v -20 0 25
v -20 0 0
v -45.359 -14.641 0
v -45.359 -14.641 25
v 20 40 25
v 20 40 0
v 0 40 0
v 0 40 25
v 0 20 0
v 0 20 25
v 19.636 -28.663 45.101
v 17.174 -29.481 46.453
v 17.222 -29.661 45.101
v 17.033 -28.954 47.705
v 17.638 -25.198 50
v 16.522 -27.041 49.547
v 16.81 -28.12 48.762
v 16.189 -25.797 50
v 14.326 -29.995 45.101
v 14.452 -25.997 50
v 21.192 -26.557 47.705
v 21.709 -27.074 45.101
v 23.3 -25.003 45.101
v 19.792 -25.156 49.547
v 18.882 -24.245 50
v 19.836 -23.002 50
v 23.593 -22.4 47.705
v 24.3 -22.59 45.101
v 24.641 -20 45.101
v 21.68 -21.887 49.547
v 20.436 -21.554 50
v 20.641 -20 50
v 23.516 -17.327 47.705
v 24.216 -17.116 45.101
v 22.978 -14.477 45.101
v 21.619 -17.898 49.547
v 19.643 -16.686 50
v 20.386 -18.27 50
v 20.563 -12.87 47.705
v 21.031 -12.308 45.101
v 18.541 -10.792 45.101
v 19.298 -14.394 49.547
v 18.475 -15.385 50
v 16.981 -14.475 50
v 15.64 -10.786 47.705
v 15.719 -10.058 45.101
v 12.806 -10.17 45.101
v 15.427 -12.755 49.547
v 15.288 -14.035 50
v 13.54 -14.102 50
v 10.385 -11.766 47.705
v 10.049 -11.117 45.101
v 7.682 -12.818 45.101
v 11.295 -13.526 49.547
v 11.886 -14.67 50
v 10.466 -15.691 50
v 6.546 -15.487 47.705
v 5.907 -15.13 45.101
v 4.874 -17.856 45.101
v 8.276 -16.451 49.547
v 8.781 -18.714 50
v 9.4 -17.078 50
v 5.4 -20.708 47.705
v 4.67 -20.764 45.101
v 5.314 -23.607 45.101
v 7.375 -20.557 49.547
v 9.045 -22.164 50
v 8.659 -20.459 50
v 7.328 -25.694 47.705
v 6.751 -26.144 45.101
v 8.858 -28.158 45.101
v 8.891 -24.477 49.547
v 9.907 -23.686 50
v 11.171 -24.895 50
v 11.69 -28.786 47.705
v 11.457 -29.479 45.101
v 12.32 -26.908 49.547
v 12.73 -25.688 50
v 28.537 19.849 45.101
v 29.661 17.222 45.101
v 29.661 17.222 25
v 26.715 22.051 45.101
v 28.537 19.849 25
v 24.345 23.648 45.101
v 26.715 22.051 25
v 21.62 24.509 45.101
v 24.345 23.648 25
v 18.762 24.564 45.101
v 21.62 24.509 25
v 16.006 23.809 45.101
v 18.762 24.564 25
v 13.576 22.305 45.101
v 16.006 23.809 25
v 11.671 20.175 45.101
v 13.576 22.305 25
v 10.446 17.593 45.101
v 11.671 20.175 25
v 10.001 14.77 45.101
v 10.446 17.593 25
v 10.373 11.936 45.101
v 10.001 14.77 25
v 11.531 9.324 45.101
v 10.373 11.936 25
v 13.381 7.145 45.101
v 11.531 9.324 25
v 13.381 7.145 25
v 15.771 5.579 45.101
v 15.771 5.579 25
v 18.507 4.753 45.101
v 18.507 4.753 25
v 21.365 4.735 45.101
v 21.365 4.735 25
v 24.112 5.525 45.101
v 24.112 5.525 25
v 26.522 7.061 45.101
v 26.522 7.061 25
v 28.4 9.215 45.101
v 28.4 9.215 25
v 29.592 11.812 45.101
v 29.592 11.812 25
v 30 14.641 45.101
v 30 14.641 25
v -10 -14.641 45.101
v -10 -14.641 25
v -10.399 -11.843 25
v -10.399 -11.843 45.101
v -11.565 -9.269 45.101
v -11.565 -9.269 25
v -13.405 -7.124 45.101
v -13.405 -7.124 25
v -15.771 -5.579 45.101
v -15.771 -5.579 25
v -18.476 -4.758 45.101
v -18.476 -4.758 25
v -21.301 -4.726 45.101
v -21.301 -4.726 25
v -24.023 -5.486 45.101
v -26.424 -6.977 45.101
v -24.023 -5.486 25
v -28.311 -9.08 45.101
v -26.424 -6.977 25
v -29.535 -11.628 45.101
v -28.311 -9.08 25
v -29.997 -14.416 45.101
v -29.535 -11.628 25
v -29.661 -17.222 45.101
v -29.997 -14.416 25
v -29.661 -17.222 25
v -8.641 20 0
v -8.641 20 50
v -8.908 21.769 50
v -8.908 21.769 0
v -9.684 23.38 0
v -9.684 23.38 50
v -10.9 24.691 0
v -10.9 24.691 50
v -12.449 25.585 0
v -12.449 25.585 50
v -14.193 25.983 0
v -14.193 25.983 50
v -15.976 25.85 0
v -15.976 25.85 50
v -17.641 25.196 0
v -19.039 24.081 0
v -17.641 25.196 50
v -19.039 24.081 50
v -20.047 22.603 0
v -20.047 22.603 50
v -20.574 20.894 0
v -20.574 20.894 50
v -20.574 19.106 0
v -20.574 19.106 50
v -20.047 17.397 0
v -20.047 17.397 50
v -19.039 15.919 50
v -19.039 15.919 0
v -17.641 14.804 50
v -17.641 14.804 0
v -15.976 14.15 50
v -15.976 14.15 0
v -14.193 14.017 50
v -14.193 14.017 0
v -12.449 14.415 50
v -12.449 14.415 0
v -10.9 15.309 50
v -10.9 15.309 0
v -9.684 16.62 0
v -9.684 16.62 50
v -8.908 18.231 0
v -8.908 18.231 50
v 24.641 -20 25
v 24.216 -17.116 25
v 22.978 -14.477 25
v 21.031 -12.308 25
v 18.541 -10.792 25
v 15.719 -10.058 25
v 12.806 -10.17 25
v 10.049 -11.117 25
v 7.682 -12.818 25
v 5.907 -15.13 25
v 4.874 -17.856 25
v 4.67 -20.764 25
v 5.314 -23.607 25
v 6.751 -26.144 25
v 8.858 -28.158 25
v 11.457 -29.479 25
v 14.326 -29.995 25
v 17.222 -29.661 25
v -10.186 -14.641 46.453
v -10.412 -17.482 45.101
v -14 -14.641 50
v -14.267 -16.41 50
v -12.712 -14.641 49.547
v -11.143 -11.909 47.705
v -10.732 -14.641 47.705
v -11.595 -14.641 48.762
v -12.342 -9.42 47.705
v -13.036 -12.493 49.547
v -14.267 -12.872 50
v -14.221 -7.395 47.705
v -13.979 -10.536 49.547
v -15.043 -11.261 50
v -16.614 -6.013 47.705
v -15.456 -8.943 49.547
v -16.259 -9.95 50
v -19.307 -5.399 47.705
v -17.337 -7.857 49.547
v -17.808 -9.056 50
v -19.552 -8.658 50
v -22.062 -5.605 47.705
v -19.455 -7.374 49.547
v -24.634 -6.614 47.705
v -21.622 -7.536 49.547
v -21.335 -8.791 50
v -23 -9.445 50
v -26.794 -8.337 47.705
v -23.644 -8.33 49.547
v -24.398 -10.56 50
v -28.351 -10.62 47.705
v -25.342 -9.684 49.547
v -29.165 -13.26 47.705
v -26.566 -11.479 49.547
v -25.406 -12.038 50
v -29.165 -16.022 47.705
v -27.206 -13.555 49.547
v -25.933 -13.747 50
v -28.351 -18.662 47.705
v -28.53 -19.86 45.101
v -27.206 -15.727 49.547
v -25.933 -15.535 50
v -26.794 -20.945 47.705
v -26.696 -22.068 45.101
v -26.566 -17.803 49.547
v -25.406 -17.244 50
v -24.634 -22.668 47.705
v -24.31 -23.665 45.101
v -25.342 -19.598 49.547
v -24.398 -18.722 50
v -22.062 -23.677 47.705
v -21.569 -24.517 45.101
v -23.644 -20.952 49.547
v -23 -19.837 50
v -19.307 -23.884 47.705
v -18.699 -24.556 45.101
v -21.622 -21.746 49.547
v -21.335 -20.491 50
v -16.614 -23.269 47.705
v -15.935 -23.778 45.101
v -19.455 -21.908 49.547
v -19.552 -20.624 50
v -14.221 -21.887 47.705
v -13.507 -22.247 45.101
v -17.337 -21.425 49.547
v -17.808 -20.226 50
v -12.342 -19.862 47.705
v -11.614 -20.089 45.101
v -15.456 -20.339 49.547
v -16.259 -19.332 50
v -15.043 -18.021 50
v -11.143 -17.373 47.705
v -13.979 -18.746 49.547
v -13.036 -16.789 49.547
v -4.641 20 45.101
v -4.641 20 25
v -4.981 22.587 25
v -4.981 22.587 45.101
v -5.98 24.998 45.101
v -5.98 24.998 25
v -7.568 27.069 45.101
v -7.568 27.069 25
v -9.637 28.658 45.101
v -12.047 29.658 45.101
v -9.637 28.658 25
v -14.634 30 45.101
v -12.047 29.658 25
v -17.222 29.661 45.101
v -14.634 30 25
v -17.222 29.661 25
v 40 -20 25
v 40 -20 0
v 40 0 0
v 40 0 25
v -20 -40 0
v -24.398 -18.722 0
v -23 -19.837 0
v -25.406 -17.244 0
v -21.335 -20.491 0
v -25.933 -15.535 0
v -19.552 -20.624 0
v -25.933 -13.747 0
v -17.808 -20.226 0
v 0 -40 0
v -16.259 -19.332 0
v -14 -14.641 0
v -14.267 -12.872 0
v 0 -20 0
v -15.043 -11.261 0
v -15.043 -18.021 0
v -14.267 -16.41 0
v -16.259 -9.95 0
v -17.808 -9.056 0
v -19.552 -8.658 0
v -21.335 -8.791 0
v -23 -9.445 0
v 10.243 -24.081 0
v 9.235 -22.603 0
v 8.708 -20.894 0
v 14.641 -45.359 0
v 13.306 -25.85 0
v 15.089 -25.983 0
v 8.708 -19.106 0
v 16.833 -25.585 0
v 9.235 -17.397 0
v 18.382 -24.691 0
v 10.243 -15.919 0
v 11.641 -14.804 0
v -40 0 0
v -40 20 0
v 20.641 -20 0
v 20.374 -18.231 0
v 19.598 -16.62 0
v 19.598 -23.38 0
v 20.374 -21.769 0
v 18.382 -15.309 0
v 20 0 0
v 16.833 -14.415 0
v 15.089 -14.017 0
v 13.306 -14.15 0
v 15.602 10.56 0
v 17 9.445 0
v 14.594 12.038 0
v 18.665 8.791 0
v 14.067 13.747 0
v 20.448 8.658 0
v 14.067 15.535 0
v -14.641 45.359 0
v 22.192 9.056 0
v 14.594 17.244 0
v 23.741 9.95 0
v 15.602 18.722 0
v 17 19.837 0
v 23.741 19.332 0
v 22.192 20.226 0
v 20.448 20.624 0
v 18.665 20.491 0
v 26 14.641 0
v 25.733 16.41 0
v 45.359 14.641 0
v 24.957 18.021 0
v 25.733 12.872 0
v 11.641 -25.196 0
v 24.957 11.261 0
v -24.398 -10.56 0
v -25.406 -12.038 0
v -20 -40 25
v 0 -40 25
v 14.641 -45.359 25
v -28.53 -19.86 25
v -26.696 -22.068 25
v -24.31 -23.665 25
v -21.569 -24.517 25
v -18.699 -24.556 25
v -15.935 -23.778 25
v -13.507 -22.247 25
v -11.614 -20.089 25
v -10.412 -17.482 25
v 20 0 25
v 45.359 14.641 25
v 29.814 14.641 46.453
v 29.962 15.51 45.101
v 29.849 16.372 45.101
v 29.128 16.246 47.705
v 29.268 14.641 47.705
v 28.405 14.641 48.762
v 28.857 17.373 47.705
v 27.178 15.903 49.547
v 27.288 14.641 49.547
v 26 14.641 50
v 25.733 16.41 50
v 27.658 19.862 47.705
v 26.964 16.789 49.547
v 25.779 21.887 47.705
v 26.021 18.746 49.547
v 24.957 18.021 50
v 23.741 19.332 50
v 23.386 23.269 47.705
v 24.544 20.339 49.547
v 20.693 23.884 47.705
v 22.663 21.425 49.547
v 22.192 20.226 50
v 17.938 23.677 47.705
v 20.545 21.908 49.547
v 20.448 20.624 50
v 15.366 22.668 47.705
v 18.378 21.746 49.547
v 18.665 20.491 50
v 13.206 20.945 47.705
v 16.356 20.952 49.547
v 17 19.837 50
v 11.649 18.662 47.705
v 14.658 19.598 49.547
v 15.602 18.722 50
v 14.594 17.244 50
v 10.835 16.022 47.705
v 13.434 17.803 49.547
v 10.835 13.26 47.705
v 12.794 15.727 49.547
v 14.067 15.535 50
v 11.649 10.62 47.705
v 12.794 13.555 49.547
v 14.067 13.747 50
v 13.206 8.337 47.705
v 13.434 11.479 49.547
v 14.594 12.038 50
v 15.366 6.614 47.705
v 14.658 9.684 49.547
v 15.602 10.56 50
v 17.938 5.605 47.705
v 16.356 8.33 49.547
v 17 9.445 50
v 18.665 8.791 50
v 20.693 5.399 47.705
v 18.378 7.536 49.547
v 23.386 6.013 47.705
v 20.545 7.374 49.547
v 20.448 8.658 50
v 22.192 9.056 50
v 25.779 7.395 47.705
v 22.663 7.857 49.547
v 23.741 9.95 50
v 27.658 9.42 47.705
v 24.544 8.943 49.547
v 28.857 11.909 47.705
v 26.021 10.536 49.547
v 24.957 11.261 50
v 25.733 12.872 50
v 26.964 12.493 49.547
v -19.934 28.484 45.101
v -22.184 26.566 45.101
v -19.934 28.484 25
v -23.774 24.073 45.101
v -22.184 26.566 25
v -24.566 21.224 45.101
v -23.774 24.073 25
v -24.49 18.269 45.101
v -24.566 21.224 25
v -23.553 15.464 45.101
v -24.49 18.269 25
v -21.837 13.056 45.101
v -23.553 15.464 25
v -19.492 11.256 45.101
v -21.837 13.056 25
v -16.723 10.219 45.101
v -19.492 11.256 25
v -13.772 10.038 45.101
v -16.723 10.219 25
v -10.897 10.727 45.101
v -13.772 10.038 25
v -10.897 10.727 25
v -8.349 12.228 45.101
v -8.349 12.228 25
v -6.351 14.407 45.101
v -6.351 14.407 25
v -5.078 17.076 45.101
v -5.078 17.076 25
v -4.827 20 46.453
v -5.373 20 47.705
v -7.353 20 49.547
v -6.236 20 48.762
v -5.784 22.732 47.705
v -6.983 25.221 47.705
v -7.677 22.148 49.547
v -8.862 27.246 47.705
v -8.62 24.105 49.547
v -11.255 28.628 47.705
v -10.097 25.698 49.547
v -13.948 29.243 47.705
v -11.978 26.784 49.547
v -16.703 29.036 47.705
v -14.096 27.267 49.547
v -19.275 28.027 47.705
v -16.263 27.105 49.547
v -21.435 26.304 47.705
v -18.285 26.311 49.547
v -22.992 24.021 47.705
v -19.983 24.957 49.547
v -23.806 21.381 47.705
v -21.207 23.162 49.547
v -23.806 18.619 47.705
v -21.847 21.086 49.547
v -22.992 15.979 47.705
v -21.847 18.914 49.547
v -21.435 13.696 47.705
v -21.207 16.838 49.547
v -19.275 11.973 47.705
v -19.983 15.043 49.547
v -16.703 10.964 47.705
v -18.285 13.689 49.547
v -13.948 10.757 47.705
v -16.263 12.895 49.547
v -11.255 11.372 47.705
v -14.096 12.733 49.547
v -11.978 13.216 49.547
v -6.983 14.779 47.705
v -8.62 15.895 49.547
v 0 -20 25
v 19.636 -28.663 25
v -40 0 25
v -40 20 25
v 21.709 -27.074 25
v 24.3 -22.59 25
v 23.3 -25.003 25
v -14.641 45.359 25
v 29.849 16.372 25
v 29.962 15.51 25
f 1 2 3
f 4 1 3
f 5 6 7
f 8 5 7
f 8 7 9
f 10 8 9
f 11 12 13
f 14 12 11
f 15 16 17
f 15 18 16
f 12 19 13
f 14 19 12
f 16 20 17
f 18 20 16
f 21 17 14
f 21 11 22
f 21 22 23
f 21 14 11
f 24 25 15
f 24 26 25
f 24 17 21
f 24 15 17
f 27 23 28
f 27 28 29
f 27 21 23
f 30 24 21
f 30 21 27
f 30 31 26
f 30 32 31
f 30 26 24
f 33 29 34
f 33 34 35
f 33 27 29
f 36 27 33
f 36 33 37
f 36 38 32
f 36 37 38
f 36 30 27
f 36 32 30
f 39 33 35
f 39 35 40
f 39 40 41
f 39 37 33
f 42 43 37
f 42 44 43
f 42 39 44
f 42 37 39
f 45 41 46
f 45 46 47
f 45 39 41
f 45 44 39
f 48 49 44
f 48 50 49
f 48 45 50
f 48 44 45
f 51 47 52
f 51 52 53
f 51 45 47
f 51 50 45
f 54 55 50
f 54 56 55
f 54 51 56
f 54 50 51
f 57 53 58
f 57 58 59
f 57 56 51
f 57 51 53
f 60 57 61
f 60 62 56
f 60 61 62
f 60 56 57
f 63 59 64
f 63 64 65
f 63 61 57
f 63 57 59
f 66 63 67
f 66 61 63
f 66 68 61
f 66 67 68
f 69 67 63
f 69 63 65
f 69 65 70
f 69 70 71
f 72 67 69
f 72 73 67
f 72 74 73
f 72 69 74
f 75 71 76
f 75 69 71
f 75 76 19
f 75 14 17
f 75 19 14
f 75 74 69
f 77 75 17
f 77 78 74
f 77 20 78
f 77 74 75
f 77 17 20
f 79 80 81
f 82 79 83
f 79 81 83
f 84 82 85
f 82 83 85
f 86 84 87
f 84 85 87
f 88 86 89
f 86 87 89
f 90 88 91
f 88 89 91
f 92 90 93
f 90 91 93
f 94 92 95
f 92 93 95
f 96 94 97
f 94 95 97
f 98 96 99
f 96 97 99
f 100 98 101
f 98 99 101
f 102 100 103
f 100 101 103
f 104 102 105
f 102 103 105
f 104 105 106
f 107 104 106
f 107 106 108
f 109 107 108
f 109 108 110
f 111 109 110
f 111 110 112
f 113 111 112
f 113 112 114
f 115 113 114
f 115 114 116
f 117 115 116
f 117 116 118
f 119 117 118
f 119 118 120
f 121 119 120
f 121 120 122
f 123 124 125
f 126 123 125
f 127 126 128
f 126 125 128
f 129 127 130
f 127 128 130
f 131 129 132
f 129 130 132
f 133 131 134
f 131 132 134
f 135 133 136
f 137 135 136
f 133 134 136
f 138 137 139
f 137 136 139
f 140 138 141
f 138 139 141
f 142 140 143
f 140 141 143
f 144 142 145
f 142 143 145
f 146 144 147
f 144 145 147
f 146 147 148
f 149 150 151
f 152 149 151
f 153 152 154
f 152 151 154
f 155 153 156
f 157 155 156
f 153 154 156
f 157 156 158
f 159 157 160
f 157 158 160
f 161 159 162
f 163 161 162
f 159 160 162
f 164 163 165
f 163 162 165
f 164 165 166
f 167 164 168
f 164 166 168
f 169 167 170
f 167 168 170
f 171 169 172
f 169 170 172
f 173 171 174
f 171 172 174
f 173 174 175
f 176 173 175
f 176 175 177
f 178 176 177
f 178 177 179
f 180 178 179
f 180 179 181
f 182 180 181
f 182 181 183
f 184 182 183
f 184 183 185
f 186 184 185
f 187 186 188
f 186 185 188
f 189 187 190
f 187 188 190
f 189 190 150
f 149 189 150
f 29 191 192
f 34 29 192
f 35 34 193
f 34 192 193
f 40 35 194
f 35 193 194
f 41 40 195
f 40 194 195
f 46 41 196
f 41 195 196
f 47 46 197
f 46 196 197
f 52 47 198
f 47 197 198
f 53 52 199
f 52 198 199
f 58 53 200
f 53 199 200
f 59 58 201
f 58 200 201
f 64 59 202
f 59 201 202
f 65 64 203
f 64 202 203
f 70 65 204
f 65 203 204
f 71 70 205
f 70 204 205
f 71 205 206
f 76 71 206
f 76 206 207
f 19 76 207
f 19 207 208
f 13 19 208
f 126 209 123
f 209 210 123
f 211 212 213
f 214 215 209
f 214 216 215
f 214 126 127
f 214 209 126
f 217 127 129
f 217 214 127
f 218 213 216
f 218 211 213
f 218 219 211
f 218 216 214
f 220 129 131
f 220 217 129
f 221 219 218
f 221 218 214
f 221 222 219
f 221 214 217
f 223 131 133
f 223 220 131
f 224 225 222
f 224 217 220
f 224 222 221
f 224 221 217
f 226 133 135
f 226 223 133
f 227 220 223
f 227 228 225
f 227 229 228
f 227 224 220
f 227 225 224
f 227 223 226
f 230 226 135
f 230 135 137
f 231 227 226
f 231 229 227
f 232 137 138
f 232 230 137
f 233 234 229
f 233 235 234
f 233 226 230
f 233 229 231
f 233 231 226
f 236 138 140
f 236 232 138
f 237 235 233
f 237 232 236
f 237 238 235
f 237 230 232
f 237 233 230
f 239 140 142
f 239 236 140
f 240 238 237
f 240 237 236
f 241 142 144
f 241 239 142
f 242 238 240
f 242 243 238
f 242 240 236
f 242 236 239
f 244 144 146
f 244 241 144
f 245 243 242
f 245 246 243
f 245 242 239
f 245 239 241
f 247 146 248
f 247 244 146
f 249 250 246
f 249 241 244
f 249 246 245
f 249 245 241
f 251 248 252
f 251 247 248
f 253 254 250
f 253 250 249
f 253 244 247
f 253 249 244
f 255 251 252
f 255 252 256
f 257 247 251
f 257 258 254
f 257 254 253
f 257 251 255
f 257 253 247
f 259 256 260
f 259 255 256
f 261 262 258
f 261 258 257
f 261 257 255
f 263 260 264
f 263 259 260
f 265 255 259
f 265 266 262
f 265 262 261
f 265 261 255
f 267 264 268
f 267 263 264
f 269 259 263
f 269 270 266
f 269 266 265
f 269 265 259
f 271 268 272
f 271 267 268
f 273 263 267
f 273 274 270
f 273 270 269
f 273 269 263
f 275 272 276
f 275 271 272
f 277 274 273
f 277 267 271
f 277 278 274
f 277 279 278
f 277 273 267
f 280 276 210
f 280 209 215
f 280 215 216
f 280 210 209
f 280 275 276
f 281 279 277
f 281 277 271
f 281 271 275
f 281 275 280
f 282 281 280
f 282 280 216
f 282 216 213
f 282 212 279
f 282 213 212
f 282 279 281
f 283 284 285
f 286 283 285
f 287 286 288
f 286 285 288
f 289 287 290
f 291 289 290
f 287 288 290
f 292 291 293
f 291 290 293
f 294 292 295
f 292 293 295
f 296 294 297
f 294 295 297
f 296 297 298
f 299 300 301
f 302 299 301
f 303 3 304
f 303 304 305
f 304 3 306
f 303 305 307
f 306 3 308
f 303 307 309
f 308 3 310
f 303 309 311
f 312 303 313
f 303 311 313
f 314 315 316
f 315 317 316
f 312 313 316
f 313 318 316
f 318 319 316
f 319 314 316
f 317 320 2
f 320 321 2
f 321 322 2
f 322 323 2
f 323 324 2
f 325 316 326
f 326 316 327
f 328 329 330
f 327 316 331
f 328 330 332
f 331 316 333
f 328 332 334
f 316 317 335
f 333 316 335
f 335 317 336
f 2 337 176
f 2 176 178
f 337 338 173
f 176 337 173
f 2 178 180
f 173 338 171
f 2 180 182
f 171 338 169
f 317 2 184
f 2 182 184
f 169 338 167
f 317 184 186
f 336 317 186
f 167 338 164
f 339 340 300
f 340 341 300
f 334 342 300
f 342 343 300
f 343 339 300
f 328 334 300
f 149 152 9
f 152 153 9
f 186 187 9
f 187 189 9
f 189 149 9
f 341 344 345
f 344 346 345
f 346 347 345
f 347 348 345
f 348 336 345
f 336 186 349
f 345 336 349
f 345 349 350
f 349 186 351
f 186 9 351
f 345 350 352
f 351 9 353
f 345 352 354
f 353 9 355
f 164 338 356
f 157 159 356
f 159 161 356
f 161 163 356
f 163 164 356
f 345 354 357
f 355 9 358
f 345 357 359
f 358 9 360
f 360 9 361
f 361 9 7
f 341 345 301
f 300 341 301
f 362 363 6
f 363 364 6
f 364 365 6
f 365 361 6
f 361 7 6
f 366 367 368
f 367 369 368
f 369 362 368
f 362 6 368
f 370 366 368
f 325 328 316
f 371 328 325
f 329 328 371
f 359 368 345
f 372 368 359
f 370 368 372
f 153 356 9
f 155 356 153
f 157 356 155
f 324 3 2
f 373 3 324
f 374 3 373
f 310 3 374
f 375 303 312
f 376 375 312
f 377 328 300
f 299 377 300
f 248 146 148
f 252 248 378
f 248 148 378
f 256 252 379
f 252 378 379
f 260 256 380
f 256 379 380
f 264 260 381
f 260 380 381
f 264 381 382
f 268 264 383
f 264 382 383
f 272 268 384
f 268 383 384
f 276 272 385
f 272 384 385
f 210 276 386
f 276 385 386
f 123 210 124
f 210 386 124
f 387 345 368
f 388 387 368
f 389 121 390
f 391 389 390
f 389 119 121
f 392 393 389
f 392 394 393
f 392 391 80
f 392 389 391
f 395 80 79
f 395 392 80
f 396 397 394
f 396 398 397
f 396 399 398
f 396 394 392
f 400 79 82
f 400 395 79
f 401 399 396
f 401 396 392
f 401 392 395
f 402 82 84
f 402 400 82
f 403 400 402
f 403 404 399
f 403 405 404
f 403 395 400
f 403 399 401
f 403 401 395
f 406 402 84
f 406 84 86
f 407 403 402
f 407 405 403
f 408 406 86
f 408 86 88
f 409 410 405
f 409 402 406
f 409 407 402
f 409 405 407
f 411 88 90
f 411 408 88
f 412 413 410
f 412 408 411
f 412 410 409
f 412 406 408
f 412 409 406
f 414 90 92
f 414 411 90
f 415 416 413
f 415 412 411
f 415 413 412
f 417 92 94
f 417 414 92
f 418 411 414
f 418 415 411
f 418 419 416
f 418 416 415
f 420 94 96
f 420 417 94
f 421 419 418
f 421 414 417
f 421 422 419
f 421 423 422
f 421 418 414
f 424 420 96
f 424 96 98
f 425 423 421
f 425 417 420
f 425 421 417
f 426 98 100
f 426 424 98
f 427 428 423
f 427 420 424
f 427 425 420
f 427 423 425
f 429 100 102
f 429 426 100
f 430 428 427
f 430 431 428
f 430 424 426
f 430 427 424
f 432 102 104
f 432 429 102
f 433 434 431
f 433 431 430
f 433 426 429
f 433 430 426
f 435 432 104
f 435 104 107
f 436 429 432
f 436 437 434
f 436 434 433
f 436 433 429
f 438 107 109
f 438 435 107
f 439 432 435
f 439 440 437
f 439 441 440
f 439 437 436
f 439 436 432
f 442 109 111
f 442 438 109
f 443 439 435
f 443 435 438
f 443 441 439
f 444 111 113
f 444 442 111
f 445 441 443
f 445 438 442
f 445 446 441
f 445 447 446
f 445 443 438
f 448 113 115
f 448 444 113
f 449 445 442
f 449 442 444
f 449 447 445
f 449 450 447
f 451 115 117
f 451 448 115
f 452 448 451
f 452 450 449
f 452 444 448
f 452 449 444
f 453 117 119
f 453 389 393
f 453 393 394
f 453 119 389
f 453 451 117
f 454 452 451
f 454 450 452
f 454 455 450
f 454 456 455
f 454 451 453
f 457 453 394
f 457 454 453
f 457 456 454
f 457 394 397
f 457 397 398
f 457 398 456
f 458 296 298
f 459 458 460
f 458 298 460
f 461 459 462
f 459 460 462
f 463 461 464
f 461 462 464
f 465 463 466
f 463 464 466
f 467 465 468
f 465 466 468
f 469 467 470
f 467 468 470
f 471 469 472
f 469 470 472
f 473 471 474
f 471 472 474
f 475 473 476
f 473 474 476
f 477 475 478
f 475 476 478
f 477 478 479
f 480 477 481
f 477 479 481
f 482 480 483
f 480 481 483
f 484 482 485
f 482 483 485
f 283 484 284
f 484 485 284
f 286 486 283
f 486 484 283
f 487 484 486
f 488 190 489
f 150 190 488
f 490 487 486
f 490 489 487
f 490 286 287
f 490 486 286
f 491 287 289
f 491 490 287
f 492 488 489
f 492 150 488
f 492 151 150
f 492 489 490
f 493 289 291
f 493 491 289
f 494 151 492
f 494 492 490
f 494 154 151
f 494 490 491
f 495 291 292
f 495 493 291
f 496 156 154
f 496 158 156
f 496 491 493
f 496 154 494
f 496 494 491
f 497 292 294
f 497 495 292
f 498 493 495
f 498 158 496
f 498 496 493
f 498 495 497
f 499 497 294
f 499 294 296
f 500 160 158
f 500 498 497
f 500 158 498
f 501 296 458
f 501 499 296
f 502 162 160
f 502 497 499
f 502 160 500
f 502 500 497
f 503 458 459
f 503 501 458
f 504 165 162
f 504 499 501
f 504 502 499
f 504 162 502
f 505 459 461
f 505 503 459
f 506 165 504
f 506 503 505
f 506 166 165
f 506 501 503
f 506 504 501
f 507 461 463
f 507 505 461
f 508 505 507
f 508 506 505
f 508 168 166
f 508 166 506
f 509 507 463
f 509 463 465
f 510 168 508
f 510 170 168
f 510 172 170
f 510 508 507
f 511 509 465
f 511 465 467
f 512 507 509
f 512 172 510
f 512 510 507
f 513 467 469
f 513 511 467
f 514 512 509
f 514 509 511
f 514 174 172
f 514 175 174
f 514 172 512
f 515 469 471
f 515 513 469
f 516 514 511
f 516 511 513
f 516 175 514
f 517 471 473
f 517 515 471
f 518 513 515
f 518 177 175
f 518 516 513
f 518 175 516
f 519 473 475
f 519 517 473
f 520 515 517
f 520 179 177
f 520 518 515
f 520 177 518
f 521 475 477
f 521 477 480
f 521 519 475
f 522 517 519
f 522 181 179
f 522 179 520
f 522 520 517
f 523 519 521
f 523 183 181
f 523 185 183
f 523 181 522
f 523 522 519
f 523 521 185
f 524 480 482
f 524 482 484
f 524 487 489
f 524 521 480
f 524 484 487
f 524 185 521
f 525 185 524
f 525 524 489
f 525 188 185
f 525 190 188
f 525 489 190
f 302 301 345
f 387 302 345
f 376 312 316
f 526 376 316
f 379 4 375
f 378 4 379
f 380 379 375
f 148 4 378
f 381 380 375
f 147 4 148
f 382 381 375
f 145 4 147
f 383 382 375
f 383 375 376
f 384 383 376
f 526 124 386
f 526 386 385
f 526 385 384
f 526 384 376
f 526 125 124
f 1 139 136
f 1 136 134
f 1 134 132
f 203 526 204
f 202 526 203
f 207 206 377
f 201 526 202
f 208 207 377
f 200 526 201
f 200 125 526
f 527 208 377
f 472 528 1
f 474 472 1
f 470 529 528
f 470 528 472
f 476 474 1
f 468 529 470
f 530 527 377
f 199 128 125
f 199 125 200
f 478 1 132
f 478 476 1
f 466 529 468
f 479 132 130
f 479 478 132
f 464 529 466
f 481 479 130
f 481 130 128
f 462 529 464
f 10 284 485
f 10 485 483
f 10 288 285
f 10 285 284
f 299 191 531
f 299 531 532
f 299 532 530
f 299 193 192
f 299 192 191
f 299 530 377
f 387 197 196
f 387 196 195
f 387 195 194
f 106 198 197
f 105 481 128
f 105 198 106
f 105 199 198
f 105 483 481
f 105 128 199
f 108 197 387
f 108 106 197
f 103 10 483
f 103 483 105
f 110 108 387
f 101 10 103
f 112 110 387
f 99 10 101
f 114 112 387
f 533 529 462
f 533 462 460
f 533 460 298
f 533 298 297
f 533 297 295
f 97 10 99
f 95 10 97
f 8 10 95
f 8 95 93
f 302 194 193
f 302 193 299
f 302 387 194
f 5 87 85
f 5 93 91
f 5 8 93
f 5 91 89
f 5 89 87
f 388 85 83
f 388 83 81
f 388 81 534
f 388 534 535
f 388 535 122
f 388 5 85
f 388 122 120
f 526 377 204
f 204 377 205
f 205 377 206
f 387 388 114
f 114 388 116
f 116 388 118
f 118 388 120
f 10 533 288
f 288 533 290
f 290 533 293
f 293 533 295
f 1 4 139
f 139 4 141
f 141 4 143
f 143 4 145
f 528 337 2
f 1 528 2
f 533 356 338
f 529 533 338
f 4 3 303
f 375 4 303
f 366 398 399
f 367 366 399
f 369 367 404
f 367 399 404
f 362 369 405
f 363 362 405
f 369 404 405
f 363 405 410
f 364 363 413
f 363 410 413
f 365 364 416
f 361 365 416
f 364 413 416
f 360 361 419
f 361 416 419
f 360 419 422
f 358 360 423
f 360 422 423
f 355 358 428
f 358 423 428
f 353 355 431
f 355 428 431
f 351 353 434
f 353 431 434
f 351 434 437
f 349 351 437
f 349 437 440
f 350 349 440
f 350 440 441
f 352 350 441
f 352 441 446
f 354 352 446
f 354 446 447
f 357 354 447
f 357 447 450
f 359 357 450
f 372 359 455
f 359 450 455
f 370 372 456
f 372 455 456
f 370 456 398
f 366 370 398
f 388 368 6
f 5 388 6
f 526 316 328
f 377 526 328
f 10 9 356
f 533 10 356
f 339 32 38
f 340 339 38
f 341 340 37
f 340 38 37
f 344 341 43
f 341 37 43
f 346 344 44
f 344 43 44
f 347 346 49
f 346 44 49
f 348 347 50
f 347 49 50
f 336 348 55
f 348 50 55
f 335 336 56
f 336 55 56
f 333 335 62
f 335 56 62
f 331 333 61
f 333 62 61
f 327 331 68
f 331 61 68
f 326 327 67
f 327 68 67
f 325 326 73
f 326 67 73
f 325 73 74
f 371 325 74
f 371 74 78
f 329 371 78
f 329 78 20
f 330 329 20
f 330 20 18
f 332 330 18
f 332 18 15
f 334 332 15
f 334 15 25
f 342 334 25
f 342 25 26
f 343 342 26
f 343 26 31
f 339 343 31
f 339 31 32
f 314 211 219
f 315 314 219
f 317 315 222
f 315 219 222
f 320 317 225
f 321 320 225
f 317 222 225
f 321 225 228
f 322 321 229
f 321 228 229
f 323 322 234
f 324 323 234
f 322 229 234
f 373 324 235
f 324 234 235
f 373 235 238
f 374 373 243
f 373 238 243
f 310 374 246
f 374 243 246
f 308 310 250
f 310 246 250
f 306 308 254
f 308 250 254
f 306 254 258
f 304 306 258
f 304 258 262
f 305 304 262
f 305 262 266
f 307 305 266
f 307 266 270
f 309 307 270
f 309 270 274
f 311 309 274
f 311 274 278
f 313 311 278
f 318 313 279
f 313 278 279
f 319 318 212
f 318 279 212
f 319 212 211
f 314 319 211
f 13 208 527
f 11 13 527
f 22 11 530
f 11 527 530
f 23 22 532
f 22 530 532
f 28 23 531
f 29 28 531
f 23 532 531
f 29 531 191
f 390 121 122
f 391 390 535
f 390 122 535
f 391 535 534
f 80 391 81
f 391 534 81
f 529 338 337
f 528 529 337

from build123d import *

# Parameters (mm, degrees)
F1_DEPTH = 25
F2_DEPTH = 50
F3_R     = 6
F4_DEPTH = 50
F5_DEPTH = 50


# Not quite as in the source:
# - a fillet or chamfer that OpenCascade refuses, or shapes differently, is made with other operations: its cross-section is extruded or revolved along the edge and cut away or added


with BuildPart() as f1:
    # F0 (on Top) → F1 (new body)
    with BuildSketch(Plane.XY):
        Polygon((0, -20), (0, 0), (-20, 0), (-45.3589838486, -14.6410161514), (-20, -40), (0, -40), align=None)
        with BuildLine():
            ThreePointArc((-10, -14.6410161514), (-18.6986197214, -24.5559750202), (-29.6612818741, -17.2216425383))
            ThreePointArc((-29.6612818741, -17.2216425383), (-21.3013802786, -4.7260572825), (-10, -14.6410161514))
        make_face(mode=Mode.SUBTRACT)
        Polygon((-20, 0), (0, 0), (0, 20), (-14.6410161514, 45.3589838486), (-40, 20), (-40, 0), align=None)
        with BuildLine():
            ThreePointArc((-4.6410161514, 20), (-20.7317359828, 12.0688505288), (-17.2216425383, 29.6612818741))
            ThreePointArc((-17.2216425383, 29.6612818741), (-8.5502963199, 27.9311494712), (-4.6410161514, 20))
        make_face(mode=Mode.SUBTRACT)
        Polygon((0, 20), (0, 0), (20, 0), (45.3589838486, 14.6410161514), (20, 40), (0, 40), align=None)
        with BuildLine():
            ThreePointArc((30, 14.6410161514), (10.0850411312, 13.3396358728), (29.6612818741, 17.2216425383))
            ThreePointArc((29.6612818741, 17.2216425383), (29.9149588688, 15.9423964299), (30, 14.6410161514))
        make_face(mode=Mode.SUBTRACT)
        Polygon((20, 0), (0, 0), (0, -20), (14.6410161514, -45.3589838486), (40, -20), (40, 0), align=None)
        with BuildLine():
            ThreePointArc((24.6410161514, -20), (22.5721656226, -26.0907198315), (17.2216425383, -29.6612818741))
            ThreePointArc((17.2216425383, -29.6612818741), (6.7098666802, -13.9092801685), (24.6410161514, -20))
        make_face(mode=Mode.SUBTRACT)
        with BuildLine():
            ThreePointArc((-10, -14.6410161514), (-21.3013802786, -4.7260572825), (-29.6612818741, -17.2216425383))
            ThreePointArc((-29.6612818741, -17.2216425383), (-18.6986197214, -24.5559750202), (-10, -14.6410161514))
        make_face()
        with BuildLine():
            ThreePointArc((-4.6410161514, 20), (-8.5502963199, 27.9311494712), (-17.2216425383, 29.6612818741))
            ThreePointArc((-17.2216425383, 29.6612818741), (-20.7317359828, 12.0688505288), (-4.6410161514, 20))
        make_face()
        with BuildLine():
            ThreePointArc((30, 14.6410161514), (29.9149588688, 15.9423964299), (29.6612818741, 17.2216425383))
            ThreePointArc((29.6612818741, 17.2216425383), (10.0850411312, 13.3396358728), (30, 14.6410161514))
        make_face()
        with BuildLine():
            ThreePointArc((24.6410161514, -20), (6.7098666802, -13.9092801685), (17.2216425383, -29.6612818741))
            ThreePointArc((17.2216425383, -29.6612818741), (22.5721656226, -26.0907198315), (24.6410161514, -20))
        make_face()
    extrude(amount=F1_DEPTH)

    # F0 (on Top) → F2 (join)
    with BuildSketch(Plane.XY):
        with BuildLine():
            ThreePointArc((24.6410161514, -20), (6.7098666802, -13.9092801685), (17.2216425383, -29.6612818741))
            ThreePointArc((17.2216425383, -29.6612818741), (22.5721656226, -26.0907198315), (24.6410161514, -20))
        make_face()
        with BuildLine():
            ThreePointArc((-10, -14.6410161514), (-21.3013802786, -4.7260572825), (-29.6612818741, -17.2216425383))
            ThreePointArc((-29.6612818741, -17.2216425383), (-18.6986197214, -24.5559750202), (-10, -14.6410161514))
        make_face()
        with BuildLine():
            ThreePointArc((-4.6410161514, 20), (-8.5502963199, 27.9311494712), (-17.2216425383, 29.6612818741))
            ThreePointArc((-17.2216425383, 29.6612818741), (-20.7317359828, 12.0688505288), (-4.6410161514, 20))
        make_face()
        with BuildLine():
            ThreePointArc((30, 14.6410161514), (29.9149588688, 15.9423964299), (29.6612818741, 17.2216425383))
            ThreePointArc((29.6612818741, 17.2216425383), (10.0850411312, 13.3396358728), (30, 14.6410161514))
        make_face()
    extrude(amount=F2_DEPTH)

    # F3 (on face) → F4 (cut)
    with BuildSketch(Plane.XY.offset(50)):
        with Locations((-14.6410161514, 20)):
            Circle(F3_R)
    extrude(amount=-F4_DEPTH, mode=Mode.SUBTRACT)

    # F3 (on face) → F5 (cut)
    with BuildSketch(Plane.XY.offset(50)):
        with Locations((20, 14.6410161514)):
            Circle(F3_R)
        with Locations((14.6410161514, -20)):
            Circle(F3_R)
        with Locations((-20, -14.6410161514)):
            Circle(F3_R)
        with Locations((-14.6410161514, 20)):
            Circle(F3_R)
    extrude(amount=-F5_DEPTH, mode=Mode.SUBTRACT)

    # F6: fillet of radius 5 on 4 edges, made by hand

    # F6_s1 → F6_t2 (revolve, cut)
    with BuildSketch(Plane.XZ.offset(14.6410161514)):
        with BuildLine():
            ThreePointArc((-10, 45.1010205144), (-11.1270166538, 48.2632981746), (-14, 50))
            Line((-14, 50), (-10, 50))
            Line((-10, 50), (-10, 45.1010205144))
        make_face()
    revolve(axis=Axis((-20, -14.6410161514, 50), (0, 0, 1)), mode=Mode.SUBTRACT)

    # F6_s3 → F6_t4 (revolve, cut)
    with BuildSketch(Plane.XZ.offset(-20)):
        with BuildLine():
            ThreePointArc((-4.6410161514, 45.1010205144), (-5.7680328052, 48.2632981746), (-8.6410161514, 50))
            Line((-8.6410161514, 50), (-4.6410161514, 50))
            Line((-4.6410161514, 50), (-4.6410161514, 45.1010205144))
        make_face()
    revolve(axis=Axis((-14.6410161514, 20, 50), (0, 0, 1)), mode=Mode.SUBTRACT)

    # F6_s5 → F6_t6 (revolve, cut)
    with BuildSketch(Plane(origin=(8.6795464871, 2.3183949069, 0), x_dir=(0, 0, 1), z_dir=(-0.9661281874, -0.2580626387, 0))):
        with BuildLine():
            ThreePointArc((45.1010205144, -33.1008630094), (48.2632981746, -31.9738463556), (50, -29.1008630094))
            Line((50, -29.1008630094), (50, -33.1008630094))
            Line((50, -33.1008630094), (45.1010205144, -33.1008630094))
        make_face()
    revolve(axis=Axis((14.6410161514, -20, 50), (0, 0, 1)), mode=Mode.SUBTRACT)

    # F6_s7 → F6_t8 (revolve, cut)
    with BuildSketch(Plane.XZ.offset(-14.6410161514)):
        with BuildLine():
            ThreePointArc((30, 45.1010205144), (28.8729833462, 48.2632981746), (26, 50))
            Line((26, 50), (30, 50))
            Line((30, 50), (30, 45.1010205144))
        make_face()
    revolve(axis=Axis((20, 14.6410161514, 50), (0, 0, 1)), mode=Mode.SUBTRACT)


solid = f1.part
